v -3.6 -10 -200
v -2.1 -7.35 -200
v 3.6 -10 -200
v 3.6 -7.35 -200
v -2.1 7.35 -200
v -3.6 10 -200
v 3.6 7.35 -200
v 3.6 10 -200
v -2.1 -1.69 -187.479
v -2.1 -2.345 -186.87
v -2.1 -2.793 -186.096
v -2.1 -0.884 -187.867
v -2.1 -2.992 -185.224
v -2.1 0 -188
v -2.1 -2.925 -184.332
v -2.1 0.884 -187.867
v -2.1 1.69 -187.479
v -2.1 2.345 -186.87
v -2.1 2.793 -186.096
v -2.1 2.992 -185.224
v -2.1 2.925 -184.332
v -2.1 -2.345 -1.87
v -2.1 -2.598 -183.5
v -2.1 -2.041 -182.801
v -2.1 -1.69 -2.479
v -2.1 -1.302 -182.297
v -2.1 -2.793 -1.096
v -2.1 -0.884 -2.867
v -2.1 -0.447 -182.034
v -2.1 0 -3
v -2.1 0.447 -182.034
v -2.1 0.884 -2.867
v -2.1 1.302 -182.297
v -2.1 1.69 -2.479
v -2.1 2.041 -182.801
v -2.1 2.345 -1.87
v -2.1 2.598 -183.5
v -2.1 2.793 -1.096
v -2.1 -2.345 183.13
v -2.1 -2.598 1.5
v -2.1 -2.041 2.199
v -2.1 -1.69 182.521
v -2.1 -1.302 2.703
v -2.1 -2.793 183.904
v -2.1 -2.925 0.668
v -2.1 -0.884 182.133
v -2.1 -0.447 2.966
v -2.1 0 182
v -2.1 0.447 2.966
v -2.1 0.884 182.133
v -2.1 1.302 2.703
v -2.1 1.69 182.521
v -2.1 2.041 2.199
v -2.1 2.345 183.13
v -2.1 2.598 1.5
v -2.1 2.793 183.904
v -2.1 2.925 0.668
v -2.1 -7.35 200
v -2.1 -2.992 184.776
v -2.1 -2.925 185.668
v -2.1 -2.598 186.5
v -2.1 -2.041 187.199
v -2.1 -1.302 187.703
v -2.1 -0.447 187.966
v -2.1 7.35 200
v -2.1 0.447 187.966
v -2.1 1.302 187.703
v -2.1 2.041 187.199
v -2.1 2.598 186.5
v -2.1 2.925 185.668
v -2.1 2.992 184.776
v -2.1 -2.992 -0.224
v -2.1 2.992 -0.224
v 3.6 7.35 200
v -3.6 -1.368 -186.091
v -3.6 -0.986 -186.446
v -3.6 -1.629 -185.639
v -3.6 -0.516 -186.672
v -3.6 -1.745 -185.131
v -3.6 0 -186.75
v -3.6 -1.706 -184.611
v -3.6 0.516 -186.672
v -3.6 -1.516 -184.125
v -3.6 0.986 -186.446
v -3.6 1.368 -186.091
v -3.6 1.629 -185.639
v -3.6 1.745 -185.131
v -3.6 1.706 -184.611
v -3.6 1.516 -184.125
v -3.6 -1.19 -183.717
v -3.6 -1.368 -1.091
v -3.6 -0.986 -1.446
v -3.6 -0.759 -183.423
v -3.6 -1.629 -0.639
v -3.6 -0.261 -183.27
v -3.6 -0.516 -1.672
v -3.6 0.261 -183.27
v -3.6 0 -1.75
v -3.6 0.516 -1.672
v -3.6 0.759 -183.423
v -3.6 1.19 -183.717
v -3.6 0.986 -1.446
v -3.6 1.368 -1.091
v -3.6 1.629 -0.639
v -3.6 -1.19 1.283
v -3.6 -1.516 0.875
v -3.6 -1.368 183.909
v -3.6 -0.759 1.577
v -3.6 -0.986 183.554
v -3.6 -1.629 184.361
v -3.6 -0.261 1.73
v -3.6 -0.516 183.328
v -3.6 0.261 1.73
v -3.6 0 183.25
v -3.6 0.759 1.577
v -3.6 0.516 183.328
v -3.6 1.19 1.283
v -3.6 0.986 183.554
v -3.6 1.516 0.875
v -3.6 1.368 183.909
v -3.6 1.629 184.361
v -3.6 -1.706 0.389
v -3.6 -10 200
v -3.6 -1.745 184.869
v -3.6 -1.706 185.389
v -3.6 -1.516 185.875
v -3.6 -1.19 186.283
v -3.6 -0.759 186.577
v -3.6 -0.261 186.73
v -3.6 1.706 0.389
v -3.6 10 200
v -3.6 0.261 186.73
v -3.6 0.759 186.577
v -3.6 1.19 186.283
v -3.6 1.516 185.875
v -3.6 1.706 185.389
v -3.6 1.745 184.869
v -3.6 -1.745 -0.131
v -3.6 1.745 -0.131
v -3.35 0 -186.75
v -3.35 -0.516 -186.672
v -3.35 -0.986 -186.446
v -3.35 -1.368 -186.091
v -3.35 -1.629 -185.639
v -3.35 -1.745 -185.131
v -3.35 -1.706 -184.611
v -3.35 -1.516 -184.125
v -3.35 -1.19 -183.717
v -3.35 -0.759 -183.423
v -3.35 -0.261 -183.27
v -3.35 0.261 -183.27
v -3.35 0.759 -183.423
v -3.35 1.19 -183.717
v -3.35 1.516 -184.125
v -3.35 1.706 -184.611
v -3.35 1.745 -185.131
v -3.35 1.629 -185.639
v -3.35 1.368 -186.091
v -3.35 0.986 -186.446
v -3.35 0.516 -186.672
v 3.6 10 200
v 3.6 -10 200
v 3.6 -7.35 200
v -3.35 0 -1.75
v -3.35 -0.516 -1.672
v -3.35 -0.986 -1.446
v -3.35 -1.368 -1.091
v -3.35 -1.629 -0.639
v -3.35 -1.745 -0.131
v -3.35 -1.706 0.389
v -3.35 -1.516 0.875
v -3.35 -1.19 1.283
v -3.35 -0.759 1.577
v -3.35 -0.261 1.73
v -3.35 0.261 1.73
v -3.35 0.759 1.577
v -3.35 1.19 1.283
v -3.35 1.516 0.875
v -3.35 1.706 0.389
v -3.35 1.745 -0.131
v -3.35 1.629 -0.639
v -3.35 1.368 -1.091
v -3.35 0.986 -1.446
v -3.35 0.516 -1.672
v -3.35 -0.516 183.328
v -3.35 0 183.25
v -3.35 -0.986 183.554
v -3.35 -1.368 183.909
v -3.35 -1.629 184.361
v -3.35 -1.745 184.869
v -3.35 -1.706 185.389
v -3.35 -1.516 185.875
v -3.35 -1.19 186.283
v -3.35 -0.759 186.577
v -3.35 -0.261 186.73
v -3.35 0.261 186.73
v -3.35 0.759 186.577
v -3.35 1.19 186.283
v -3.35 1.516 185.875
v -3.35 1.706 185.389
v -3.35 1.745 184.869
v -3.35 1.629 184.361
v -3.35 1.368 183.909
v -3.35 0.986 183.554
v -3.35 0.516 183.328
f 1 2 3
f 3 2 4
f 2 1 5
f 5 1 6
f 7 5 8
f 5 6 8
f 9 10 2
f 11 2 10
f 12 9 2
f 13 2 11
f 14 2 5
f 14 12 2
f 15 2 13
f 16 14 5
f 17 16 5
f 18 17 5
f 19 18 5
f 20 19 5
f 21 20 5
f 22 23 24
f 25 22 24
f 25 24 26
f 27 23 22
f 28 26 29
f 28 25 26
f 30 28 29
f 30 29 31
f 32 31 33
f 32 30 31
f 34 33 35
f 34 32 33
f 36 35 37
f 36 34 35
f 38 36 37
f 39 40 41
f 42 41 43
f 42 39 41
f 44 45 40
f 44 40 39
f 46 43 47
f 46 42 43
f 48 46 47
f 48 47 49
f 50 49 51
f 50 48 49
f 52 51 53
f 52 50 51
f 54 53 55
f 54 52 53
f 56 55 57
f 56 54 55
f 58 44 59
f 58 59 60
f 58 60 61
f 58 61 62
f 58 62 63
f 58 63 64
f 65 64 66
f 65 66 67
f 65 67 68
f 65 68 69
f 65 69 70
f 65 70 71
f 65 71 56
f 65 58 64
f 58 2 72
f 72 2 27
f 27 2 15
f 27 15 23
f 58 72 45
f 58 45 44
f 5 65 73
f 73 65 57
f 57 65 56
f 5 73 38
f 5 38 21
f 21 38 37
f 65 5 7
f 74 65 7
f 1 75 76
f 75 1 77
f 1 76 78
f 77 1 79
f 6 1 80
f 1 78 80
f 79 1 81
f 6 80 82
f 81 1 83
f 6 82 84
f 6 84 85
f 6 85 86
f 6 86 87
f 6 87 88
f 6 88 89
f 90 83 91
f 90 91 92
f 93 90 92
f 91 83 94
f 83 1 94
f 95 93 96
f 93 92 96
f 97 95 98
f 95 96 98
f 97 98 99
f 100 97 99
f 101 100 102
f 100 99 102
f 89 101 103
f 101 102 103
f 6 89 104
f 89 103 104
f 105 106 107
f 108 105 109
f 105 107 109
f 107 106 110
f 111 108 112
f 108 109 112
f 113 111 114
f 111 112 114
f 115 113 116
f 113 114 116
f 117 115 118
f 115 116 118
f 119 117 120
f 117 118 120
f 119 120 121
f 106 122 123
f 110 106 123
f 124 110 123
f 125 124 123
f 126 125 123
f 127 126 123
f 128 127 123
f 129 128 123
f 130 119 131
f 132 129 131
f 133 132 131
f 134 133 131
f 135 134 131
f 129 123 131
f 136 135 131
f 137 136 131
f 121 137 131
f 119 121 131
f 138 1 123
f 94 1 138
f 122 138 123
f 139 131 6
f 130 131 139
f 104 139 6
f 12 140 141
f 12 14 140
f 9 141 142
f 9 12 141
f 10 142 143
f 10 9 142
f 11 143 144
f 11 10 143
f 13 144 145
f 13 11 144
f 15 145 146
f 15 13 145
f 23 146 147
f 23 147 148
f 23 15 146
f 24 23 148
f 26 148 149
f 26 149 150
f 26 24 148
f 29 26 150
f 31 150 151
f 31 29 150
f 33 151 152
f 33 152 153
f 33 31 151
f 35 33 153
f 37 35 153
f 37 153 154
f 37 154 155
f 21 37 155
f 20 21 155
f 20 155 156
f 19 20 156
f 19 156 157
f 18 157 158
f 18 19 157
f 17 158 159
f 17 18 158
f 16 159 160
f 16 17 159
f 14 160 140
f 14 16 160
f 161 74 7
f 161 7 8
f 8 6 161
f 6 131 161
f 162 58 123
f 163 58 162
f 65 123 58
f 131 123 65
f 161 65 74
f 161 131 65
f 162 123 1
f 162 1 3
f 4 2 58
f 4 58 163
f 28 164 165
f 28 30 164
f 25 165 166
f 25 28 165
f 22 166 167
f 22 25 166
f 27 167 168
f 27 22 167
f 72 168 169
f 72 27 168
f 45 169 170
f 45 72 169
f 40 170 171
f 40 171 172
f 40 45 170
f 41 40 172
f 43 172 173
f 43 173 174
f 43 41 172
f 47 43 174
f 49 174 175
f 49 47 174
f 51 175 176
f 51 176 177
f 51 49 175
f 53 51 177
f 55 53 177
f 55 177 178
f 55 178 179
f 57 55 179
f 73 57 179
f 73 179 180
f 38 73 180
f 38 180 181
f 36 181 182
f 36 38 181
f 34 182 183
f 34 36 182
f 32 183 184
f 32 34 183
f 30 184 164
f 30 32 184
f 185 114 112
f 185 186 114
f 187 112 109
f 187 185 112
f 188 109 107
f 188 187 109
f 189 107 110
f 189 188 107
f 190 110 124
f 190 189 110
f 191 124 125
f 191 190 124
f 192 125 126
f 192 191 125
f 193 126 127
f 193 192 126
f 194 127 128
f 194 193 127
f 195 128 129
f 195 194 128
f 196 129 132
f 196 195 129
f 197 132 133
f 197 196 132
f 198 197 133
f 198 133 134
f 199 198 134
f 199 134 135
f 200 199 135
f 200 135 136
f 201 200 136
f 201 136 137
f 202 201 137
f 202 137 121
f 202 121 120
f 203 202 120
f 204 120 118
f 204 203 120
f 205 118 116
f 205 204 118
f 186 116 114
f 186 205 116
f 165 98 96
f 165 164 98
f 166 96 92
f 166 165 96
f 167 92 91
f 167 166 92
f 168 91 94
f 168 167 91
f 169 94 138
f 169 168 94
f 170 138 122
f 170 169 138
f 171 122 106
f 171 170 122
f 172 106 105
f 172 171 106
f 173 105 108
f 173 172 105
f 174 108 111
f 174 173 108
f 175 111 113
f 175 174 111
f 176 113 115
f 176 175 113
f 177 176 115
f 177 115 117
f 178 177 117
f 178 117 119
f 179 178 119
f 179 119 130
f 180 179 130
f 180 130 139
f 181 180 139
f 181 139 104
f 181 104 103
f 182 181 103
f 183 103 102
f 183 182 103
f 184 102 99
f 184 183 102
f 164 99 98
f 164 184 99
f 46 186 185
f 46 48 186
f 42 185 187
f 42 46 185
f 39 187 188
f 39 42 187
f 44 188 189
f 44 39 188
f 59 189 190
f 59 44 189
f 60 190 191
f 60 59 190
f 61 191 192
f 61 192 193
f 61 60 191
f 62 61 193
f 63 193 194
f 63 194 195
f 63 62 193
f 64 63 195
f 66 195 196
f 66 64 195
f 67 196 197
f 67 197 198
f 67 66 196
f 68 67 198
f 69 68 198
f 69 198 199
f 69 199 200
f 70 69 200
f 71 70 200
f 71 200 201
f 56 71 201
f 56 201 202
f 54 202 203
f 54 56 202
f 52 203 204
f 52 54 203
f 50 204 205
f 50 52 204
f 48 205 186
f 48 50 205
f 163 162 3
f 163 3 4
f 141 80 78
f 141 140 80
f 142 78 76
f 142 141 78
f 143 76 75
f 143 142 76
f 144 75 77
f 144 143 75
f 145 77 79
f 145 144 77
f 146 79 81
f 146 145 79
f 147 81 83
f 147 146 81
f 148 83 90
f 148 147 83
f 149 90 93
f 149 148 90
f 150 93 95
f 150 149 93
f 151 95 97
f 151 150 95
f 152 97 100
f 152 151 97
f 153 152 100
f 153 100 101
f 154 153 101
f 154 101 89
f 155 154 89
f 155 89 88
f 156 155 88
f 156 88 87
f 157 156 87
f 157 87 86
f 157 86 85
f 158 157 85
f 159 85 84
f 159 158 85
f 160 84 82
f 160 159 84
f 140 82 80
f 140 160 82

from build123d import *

# Parameters (mm, degrees)
SKETCH_1_W                 = 7.2
SKETCH_1_H                 = 20
EXTRUDE_1_DEPTH            = 200
SKETCH_2_W                 = 5.7
SKETCH_2_H                 = 14.7
CUT_EXTRUDE_1_DEPTH        = 200
PATTERN_LINEAR_1_COUNT     = 2
PATTERN_LINEAR_1_PITCH     = 185
PATTERN_LINEAR_1_COL_COUNT = 2
PATTERN_LINEAR_1_COL_PITCH = 185


with BuildPart() as part:
    # 草图1 → 凸台-拉伸1 (new, symmetric)
    with BuildSketch(Plane.XY):
        Rectangle(SKETCH_1_W, SKETCH_1_H)
    extrude(amount=EXTRUDE_1_DEPTH, both=True)

    # 草图2 → 切除-拉伸1 (cut, symmetric)
    with BuildSketch(Plane.XY):
        with Locations((0.75, 0)):
            Rectangle(SKETCH_2_W, SKETCH_2_H)
    extrude(amount=CUT_EXTRUDE_1_DEPTH, both=True, mode=Mode.SUBTRACT)

    # 草图4 → 切除-旋转1 (revolve, cut)
    with BuildSketch(Plane.XY, mode=Mode.PRIVATE) as cut_revolve_1_sk:
        Polygon((-3.6, 1.75), (-3.35, 1.75), (-2.1, 3), (-2.1, 0), (-3.6, 0), align=None)
    cut_revolve_1 = revolve(cut_revolve_1_sk.sketch.rotate(Axis((-2.1, 0, 0), (-1, 0, 0)), 90), axis=Axis((-2.1, 0, 0), (-1, 0, 0)), mode=Mode.SUBTRACT)

    # 阵列(线性)1: 切除-旋转1 ×2
    with Locations(*[(0, 0, -i * PATTERN_LINEAR_1_PITCH) for i in range(1, PATTERN_LINEAR_1_COUNT)]):
        add(cut_revolve_1, mode=Mode.SUBTRACT)

    # 阵列(线性)1 col: 切除-旋转1 ×2
    with Locations(*[(0, 0, i * PATTERN_LINEAR_1_COL_PITCH) for i in range(1, PATTERN_LINEAR_1_COL_COUNT)]):
        add(cut_revolve_1, mode=Mode.SUBTRACT)


solid = part.part
